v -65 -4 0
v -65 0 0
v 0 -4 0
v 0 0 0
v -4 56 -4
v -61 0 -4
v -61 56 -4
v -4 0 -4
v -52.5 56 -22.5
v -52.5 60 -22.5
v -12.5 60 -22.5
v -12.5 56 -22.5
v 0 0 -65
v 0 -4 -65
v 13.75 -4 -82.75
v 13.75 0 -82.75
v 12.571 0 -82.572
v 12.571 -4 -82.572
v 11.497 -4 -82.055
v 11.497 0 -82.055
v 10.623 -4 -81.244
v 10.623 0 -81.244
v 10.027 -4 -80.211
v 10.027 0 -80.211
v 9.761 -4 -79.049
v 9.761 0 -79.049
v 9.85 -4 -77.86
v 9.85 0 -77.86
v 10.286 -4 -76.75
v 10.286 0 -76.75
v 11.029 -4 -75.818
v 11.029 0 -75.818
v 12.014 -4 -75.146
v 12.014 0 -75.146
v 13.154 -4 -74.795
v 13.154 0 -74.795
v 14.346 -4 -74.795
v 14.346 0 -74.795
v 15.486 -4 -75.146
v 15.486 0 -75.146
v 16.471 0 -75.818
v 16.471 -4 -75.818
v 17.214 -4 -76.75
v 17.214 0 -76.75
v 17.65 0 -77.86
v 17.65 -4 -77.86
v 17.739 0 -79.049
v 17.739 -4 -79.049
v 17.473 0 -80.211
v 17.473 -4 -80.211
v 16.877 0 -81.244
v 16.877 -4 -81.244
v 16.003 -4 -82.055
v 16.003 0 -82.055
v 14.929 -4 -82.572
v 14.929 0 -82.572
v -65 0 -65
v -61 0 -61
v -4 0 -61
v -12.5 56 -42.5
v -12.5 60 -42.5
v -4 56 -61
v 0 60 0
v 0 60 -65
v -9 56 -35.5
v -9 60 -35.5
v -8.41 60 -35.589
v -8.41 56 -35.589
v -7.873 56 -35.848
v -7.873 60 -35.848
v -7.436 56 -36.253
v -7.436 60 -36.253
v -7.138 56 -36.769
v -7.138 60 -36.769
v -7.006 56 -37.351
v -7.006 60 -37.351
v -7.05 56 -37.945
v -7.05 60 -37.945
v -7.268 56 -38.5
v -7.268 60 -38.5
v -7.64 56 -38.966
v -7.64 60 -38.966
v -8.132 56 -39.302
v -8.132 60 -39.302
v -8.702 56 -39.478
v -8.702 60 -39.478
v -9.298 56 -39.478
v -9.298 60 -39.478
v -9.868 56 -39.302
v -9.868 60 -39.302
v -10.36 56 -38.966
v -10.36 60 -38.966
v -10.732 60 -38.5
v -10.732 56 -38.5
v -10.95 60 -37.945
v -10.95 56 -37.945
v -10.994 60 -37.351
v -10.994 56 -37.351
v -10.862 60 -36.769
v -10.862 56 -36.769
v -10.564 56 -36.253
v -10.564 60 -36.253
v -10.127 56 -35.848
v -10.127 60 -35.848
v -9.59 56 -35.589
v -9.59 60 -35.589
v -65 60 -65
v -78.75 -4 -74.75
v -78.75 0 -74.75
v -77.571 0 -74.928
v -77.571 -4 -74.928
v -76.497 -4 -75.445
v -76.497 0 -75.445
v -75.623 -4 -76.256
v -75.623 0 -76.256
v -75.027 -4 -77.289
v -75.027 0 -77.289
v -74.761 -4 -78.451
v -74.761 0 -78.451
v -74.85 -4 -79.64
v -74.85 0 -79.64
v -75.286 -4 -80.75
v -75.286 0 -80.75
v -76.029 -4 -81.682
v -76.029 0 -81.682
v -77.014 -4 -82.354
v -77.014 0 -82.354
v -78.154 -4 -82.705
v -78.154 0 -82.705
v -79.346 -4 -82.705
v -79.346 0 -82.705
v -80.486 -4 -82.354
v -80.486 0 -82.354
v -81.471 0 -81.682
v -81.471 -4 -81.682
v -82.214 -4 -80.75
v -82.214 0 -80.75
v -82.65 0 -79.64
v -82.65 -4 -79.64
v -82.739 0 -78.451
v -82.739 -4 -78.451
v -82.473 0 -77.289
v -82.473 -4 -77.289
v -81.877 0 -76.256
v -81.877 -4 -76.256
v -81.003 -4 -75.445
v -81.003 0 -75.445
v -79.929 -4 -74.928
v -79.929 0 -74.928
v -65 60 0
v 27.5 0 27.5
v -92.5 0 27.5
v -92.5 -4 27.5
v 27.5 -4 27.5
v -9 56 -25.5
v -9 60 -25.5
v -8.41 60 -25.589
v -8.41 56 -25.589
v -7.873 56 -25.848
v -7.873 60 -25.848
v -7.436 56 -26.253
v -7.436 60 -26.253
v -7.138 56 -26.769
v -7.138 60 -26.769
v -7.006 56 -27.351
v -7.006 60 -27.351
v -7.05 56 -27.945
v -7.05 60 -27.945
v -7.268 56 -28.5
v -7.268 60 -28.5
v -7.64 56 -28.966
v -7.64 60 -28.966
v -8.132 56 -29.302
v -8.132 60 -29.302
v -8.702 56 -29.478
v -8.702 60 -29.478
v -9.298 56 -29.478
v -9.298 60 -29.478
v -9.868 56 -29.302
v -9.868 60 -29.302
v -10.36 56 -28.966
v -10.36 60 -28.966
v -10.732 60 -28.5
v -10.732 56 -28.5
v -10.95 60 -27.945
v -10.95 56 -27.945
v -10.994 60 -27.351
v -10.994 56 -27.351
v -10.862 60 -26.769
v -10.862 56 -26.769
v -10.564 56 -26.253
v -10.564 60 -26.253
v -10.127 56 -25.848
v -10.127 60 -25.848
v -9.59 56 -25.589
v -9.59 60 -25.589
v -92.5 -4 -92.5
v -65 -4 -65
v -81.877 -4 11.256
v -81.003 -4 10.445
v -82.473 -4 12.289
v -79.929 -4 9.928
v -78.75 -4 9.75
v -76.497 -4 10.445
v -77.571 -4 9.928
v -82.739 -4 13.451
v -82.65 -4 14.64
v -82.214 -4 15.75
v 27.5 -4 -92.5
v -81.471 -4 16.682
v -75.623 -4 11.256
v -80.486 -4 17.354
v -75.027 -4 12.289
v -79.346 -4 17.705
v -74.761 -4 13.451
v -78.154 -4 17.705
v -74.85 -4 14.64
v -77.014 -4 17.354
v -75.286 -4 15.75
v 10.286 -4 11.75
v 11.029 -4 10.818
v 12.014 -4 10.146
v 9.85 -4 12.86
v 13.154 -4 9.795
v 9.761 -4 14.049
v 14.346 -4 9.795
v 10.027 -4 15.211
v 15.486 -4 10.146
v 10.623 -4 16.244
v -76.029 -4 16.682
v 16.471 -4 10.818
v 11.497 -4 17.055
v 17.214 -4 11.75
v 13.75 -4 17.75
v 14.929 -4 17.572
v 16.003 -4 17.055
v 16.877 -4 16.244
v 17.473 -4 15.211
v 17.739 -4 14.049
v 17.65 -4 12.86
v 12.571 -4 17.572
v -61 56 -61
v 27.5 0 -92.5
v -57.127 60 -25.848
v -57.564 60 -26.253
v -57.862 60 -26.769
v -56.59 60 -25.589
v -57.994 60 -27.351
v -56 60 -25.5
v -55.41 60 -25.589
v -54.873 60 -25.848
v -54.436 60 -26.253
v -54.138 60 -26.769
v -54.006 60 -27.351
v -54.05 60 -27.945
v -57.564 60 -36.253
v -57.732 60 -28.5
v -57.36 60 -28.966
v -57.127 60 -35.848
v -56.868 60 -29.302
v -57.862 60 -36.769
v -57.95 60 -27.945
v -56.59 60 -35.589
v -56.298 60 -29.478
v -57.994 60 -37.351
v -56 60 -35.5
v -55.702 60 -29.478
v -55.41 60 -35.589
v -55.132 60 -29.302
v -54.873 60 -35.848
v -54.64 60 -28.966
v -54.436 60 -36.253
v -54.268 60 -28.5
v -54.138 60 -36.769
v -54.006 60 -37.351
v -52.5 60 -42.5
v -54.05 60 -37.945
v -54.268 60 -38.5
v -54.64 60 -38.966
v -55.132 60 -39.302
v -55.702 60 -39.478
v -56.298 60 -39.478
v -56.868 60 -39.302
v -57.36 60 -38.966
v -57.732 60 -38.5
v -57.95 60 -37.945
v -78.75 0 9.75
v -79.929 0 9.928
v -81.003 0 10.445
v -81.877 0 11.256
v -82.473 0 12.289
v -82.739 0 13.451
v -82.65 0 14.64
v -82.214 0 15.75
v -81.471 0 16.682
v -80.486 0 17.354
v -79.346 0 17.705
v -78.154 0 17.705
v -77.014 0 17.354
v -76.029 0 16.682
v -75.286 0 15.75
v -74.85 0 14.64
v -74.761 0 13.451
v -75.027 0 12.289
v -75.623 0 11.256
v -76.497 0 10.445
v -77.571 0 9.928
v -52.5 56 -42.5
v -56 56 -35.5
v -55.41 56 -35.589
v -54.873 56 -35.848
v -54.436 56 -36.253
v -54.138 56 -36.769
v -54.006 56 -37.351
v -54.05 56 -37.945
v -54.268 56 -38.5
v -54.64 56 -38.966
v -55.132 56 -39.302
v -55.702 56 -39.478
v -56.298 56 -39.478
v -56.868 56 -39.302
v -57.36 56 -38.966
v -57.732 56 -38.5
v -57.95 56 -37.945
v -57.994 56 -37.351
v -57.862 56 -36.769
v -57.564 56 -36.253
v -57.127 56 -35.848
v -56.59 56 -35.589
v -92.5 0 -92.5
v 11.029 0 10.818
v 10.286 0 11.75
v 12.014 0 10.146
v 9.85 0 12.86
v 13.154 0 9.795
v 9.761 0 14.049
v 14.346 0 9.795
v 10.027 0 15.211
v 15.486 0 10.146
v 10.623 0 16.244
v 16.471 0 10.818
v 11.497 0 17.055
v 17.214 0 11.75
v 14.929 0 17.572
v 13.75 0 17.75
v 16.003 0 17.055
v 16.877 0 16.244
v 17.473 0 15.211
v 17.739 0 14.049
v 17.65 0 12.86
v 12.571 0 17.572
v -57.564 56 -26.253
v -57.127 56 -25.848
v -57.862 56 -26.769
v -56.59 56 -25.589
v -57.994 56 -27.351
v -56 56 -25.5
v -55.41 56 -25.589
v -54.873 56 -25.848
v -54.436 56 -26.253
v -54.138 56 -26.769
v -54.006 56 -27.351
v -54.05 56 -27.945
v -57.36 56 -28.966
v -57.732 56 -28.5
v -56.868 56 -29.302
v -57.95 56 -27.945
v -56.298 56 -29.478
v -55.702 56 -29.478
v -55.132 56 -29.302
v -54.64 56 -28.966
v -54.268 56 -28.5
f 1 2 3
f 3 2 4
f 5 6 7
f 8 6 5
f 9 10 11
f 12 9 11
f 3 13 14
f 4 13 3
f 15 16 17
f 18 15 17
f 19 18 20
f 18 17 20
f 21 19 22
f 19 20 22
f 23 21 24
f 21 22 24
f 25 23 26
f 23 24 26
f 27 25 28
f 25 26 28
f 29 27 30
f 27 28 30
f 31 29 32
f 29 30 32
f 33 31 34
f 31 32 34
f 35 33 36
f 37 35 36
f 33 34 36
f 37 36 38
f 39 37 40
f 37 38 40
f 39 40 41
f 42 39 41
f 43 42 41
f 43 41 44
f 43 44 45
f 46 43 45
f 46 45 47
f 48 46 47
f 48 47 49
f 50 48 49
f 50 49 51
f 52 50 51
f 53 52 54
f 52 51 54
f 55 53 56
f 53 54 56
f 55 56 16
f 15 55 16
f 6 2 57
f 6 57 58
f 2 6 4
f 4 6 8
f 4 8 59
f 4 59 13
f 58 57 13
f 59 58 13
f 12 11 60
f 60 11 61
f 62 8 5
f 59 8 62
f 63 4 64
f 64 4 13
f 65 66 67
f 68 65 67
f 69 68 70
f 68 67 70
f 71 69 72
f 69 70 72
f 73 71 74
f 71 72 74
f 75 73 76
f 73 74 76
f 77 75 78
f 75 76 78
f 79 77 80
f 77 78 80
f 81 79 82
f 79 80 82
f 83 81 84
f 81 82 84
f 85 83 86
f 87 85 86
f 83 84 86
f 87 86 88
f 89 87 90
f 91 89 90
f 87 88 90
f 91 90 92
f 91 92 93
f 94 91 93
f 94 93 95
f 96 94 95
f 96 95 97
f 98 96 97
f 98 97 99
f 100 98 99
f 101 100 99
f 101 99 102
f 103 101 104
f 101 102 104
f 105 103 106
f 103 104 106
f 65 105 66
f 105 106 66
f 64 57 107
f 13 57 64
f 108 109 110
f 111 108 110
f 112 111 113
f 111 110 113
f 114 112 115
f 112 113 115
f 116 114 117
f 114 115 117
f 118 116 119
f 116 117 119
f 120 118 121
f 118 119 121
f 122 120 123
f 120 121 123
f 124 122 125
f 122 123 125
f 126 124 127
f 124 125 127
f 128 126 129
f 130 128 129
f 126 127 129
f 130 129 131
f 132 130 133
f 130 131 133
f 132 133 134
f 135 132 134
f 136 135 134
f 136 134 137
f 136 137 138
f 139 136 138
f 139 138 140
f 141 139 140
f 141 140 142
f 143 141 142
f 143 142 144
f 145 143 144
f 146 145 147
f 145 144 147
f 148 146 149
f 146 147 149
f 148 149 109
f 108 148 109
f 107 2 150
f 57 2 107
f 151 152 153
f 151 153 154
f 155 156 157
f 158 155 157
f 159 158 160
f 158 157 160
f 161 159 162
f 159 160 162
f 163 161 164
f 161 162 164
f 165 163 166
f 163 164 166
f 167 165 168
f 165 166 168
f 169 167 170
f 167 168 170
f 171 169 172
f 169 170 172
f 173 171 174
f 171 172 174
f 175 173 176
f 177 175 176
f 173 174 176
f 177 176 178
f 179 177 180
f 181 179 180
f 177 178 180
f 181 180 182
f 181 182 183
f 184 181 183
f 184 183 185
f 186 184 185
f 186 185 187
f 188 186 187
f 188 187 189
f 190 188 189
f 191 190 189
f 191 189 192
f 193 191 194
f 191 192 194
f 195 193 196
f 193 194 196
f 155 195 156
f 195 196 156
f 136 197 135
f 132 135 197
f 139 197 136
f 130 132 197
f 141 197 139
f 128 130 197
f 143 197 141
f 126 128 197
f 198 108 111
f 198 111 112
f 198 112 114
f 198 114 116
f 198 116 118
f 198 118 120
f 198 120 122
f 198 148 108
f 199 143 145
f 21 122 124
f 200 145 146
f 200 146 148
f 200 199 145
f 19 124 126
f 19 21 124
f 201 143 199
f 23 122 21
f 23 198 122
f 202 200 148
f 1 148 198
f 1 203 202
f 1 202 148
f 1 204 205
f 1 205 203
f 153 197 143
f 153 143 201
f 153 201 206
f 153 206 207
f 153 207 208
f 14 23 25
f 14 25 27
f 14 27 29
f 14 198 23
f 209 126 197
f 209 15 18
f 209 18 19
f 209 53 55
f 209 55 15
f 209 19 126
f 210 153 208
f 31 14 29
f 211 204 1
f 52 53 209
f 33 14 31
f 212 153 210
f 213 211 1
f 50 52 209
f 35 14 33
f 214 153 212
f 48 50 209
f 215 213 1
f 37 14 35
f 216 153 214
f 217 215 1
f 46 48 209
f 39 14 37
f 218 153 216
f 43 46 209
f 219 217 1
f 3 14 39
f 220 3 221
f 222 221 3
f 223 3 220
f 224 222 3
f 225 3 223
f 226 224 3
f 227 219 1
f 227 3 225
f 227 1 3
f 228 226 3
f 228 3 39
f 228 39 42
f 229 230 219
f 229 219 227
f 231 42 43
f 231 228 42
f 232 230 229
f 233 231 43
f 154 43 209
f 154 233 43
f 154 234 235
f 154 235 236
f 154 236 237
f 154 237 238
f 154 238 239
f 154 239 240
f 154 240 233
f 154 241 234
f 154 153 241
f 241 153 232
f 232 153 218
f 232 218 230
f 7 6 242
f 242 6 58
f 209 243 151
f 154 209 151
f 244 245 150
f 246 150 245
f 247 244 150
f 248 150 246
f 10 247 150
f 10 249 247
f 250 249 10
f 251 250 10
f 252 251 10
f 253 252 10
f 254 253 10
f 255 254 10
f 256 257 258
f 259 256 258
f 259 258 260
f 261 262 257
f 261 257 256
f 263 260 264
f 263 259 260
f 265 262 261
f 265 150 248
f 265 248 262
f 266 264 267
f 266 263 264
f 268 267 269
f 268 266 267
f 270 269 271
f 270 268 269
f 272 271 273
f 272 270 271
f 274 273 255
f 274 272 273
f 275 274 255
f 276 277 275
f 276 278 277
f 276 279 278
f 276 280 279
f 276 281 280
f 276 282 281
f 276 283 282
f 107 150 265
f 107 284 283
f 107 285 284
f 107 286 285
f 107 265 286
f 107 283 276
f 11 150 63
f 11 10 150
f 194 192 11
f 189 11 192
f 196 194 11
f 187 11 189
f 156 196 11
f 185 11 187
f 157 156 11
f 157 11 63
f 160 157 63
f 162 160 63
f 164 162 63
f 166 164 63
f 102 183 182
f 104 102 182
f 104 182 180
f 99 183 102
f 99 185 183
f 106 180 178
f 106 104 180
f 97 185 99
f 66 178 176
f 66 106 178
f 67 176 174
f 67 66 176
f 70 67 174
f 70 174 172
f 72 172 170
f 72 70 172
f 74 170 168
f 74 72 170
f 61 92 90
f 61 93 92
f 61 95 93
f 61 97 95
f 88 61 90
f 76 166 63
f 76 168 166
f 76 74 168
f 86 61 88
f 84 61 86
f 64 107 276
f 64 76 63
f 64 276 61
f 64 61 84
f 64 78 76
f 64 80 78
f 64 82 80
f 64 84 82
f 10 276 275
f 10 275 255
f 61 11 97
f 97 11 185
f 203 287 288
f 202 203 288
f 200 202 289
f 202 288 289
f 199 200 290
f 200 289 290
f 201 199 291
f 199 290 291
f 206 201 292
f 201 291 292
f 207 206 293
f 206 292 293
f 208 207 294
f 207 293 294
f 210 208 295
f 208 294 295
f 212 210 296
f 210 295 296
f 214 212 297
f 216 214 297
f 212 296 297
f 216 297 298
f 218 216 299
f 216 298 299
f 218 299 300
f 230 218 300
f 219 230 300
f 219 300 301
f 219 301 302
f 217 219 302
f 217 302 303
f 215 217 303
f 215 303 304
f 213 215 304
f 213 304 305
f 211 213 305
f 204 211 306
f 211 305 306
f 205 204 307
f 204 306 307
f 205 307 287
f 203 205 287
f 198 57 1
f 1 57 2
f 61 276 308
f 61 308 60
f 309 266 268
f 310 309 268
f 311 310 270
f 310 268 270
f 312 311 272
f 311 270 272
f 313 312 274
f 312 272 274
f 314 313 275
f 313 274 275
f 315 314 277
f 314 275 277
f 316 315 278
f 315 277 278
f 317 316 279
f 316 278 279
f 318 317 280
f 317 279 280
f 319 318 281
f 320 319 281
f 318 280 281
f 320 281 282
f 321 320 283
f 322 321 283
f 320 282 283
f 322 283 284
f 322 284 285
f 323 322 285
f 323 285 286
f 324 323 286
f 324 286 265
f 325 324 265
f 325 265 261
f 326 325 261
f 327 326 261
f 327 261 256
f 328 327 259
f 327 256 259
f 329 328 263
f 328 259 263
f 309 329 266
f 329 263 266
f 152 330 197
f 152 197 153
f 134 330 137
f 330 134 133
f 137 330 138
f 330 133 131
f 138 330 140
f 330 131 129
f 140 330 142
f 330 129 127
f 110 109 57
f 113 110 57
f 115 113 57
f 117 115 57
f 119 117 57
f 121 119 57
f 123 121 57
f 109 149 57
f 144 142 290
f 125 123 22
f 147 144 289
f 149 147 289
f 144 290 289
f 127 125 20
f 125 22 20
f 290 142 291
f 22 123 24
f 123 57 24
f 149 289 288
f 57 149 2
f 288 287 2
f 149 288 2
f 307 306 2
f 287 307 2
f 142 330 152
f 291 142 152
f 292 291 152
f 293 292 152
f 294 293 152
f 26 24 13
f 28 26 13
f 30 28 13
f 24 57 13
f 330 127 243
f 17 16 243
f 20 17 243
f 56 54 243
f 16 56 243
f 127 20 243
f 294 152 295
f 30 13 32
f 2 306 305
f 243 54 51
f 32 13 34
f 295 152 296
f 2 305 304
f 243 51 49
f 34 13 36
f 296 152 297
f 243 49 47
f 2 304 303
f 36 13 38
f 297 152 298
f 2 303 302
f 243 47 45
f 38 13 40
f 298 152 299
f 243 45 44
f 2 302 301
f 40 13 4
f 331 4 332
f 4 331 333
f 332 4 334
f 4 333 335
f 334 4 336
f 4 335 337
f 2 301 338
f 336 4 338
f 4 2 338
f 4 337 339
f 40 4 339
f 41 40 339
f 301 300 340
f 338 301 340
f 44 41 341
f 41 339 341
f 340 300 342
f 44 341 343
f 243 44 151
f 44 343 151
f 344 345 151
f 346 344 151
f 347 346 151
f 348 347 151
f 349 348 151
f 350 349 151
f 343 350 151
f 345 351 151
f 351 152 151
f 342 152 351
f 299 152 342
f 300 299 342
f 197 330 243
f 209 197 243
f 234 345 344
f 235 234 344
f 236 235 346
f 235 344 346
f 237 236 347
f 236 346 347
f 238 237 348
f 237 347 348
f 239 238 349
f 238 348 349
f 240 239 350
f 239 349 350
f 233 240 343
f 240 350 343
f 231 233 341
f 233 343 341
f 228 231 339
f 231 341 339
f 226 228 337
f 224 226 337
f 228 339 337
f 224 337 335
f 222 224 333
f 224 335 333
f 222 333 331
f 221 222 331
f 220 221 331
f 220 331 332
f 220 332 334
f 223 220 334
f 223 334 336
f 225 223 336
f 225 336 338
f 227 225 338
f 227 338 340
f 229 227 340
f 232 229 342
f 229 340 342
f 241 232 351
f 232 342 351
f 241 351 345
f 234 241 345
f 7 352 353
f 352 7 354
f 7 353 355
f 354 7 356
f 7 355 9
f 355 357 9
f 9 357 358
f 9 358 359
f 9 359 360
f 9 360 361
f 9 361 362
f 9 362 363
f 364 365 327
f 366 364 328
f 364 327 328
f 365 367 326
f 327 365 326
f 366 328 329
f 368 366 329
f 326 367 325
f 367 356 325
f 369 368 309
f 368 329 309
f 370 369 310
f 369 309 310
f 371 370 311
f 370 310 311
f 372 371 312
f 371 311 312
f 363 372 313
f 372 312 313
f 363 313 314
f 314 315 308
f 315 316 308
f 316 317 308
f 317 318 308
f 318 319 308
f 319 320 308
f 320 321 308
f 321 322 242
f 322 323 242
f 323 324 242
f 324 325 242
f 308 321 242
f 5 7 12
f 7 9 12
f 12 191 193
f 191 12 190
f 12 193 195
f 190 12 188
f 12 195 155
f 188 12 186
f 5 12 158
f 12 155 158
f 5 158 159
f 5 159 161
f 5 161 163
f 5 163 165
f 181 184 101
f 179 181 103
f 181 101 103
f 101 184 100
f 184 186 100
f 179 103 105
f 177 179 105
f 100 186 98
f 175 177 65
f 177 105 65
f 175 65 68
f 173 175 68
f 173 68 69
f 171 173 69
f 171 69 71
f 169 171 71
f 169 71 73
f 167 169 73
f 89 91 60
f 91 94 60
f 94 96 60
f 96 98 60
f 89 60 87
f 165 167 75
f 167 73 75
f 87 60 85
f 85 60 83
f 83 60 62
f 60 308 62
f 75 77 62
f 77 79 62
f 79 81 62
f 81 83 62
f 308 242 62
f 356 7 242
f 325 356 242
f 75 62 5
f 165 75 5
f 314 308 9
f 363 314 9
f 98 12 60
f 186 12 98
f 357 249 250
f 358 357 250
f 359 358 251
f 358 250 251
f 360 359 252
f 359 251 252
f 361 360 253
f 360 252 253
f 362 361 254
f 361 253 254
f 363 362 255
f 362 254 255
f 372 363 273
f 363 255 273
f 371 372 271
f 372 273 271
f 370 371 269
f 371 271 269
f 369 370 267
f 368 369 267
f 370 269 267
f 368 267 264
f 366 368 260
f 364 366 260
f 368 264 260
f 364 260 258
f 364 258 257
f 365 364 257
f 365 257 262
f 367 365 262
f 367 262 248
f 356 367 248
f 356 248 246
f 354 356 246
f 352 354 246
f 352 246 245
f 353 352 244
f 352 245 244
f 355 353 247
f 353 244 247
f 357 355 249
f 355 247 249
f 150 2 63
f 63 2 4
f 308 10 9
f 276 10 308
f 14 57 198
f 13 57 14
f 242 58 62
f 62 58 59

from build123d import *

# Parameters (mm, degrees)
IZIM1_W                     = 65
IZIM1_H                     = 65
Y_KSEKLIK_EKSTR_ZYON1_DEPTH = 60
BO_ALTMA1_T                 = -4
IZIM10_W                    = 120
IZIM10_H                    = 120
IZIM10_W_2                  = 65
IZIM10_H_2                  = 65
Y_KSEKLIK_EKSTR_ZYON5_DEPTH = 4
IZIM11_R                    = 4
KES_EKSTR_ZYON4_DEPTH       = 4
IZIM12_R                    = 2
IZIM12_W                    = 40
IZIM12_H                    = 20
KES_EKSTR_ZYON5_DEPTH       = 4


with BuildPart() as part:
    # Çizim1 → Yükseklik-Ekstrüzyon1 (new body)
    with BuildSketch(Plane(origin=(0, 0, 0), x_dir=(1, 0, 0), z_dir=(0, 1, 0))):
        with Locations((-32.5, 32.5)):
            Rectangle(IZIM1_W, IZIM1_H)
    extrude(amount=Y_KSEKLIK_EKSTR_ZYON1_DEPTH)

    # İç Boşaltma1
    bo_altma1_openings = [part.faces().sort_by_distance(p)[0] for p in [
        (-32.5, 0, -32.5),
    ]]
    offset(amount=BO_ALTMA1_T, openings=bo_altma1_openings, kind=Kind.INTERSECTION)

    # Çizim12 → Kes-Ekstrüzyon5 (cut)
    with BuildSketch(Plane(origin=(0, 60, 0), x_dir=(1, 0, 0), z_dir=(0, 1, 0))):
        with Locations(Location((-56, 37.5, 0), (0, 0, 270))):
            Circle(IZIM12_R)
        with Locations(Location((-56, 27.5, 0), (0, 0, 270))):
            Circle(IZIM12_R)
        with Locations(Location((-9, 27.5, 0), (0, 0, 270))):
            Circle(IZIM12_R)
        with Locations(Location((-9, 37.5, 0), (0, 0, 270))):
            Circle(IZIM12_R)
        with Locations((-32.5, 32.5)):
            Rectangle(IZIM12_W, IZIM12_H)
    extrude(amount=-KES_EKSTR_ZYON5_DEPTH, mode=Mode.SUBTRACT)


with BuildPart() as body_2:
    # Çizim10 → Yükseklik-Ekstrüzyon5 (new body)
    with BuildSketch(Plane.XZ):
        with Locations((-32.5, -32.5)):
            Rectangle(IZIM10_W, IZIM10_H)
        with Locations((-32.5, -32.5)):
            Rectangle(IZIM10_W_2, IZIM10_H_2, mode=Mode.SUBTRACT)
    extrude(amount=Y_KSEKLIK_EKSTR_ZYON5_DEPTH)

    # Çizim11 → Kes-Ekstrüzyon4 (cut)
    with BuildSketch(Plane(origin=(0, 0, 0), x_dir=(1, 0, 0), z_dir=(0, 1, 0))):
        with Locations(Location((-78.75, 78.75, 0), (0, 0, 270))):
            Circle(IZIM11_R)
        with Locations(Location((-78.75, -13.75, 0), (0, 0, 90))):
            Circle(IZIM11_R)
        with Locations(Location((13.75, -13.75, 0), (0, 0, 270))):
            Circle(IZIM11_R)
        with Locations(Location((13.75, 78.75, 0), (0, 0, 90))):
            Circle(IZIM11_R)
    extrude(amount=-KES_EKSTR_ZYON4_DEPTH, mode=Mode.SUBTRACT)


solid = Compound([part.part, body_2.part])
